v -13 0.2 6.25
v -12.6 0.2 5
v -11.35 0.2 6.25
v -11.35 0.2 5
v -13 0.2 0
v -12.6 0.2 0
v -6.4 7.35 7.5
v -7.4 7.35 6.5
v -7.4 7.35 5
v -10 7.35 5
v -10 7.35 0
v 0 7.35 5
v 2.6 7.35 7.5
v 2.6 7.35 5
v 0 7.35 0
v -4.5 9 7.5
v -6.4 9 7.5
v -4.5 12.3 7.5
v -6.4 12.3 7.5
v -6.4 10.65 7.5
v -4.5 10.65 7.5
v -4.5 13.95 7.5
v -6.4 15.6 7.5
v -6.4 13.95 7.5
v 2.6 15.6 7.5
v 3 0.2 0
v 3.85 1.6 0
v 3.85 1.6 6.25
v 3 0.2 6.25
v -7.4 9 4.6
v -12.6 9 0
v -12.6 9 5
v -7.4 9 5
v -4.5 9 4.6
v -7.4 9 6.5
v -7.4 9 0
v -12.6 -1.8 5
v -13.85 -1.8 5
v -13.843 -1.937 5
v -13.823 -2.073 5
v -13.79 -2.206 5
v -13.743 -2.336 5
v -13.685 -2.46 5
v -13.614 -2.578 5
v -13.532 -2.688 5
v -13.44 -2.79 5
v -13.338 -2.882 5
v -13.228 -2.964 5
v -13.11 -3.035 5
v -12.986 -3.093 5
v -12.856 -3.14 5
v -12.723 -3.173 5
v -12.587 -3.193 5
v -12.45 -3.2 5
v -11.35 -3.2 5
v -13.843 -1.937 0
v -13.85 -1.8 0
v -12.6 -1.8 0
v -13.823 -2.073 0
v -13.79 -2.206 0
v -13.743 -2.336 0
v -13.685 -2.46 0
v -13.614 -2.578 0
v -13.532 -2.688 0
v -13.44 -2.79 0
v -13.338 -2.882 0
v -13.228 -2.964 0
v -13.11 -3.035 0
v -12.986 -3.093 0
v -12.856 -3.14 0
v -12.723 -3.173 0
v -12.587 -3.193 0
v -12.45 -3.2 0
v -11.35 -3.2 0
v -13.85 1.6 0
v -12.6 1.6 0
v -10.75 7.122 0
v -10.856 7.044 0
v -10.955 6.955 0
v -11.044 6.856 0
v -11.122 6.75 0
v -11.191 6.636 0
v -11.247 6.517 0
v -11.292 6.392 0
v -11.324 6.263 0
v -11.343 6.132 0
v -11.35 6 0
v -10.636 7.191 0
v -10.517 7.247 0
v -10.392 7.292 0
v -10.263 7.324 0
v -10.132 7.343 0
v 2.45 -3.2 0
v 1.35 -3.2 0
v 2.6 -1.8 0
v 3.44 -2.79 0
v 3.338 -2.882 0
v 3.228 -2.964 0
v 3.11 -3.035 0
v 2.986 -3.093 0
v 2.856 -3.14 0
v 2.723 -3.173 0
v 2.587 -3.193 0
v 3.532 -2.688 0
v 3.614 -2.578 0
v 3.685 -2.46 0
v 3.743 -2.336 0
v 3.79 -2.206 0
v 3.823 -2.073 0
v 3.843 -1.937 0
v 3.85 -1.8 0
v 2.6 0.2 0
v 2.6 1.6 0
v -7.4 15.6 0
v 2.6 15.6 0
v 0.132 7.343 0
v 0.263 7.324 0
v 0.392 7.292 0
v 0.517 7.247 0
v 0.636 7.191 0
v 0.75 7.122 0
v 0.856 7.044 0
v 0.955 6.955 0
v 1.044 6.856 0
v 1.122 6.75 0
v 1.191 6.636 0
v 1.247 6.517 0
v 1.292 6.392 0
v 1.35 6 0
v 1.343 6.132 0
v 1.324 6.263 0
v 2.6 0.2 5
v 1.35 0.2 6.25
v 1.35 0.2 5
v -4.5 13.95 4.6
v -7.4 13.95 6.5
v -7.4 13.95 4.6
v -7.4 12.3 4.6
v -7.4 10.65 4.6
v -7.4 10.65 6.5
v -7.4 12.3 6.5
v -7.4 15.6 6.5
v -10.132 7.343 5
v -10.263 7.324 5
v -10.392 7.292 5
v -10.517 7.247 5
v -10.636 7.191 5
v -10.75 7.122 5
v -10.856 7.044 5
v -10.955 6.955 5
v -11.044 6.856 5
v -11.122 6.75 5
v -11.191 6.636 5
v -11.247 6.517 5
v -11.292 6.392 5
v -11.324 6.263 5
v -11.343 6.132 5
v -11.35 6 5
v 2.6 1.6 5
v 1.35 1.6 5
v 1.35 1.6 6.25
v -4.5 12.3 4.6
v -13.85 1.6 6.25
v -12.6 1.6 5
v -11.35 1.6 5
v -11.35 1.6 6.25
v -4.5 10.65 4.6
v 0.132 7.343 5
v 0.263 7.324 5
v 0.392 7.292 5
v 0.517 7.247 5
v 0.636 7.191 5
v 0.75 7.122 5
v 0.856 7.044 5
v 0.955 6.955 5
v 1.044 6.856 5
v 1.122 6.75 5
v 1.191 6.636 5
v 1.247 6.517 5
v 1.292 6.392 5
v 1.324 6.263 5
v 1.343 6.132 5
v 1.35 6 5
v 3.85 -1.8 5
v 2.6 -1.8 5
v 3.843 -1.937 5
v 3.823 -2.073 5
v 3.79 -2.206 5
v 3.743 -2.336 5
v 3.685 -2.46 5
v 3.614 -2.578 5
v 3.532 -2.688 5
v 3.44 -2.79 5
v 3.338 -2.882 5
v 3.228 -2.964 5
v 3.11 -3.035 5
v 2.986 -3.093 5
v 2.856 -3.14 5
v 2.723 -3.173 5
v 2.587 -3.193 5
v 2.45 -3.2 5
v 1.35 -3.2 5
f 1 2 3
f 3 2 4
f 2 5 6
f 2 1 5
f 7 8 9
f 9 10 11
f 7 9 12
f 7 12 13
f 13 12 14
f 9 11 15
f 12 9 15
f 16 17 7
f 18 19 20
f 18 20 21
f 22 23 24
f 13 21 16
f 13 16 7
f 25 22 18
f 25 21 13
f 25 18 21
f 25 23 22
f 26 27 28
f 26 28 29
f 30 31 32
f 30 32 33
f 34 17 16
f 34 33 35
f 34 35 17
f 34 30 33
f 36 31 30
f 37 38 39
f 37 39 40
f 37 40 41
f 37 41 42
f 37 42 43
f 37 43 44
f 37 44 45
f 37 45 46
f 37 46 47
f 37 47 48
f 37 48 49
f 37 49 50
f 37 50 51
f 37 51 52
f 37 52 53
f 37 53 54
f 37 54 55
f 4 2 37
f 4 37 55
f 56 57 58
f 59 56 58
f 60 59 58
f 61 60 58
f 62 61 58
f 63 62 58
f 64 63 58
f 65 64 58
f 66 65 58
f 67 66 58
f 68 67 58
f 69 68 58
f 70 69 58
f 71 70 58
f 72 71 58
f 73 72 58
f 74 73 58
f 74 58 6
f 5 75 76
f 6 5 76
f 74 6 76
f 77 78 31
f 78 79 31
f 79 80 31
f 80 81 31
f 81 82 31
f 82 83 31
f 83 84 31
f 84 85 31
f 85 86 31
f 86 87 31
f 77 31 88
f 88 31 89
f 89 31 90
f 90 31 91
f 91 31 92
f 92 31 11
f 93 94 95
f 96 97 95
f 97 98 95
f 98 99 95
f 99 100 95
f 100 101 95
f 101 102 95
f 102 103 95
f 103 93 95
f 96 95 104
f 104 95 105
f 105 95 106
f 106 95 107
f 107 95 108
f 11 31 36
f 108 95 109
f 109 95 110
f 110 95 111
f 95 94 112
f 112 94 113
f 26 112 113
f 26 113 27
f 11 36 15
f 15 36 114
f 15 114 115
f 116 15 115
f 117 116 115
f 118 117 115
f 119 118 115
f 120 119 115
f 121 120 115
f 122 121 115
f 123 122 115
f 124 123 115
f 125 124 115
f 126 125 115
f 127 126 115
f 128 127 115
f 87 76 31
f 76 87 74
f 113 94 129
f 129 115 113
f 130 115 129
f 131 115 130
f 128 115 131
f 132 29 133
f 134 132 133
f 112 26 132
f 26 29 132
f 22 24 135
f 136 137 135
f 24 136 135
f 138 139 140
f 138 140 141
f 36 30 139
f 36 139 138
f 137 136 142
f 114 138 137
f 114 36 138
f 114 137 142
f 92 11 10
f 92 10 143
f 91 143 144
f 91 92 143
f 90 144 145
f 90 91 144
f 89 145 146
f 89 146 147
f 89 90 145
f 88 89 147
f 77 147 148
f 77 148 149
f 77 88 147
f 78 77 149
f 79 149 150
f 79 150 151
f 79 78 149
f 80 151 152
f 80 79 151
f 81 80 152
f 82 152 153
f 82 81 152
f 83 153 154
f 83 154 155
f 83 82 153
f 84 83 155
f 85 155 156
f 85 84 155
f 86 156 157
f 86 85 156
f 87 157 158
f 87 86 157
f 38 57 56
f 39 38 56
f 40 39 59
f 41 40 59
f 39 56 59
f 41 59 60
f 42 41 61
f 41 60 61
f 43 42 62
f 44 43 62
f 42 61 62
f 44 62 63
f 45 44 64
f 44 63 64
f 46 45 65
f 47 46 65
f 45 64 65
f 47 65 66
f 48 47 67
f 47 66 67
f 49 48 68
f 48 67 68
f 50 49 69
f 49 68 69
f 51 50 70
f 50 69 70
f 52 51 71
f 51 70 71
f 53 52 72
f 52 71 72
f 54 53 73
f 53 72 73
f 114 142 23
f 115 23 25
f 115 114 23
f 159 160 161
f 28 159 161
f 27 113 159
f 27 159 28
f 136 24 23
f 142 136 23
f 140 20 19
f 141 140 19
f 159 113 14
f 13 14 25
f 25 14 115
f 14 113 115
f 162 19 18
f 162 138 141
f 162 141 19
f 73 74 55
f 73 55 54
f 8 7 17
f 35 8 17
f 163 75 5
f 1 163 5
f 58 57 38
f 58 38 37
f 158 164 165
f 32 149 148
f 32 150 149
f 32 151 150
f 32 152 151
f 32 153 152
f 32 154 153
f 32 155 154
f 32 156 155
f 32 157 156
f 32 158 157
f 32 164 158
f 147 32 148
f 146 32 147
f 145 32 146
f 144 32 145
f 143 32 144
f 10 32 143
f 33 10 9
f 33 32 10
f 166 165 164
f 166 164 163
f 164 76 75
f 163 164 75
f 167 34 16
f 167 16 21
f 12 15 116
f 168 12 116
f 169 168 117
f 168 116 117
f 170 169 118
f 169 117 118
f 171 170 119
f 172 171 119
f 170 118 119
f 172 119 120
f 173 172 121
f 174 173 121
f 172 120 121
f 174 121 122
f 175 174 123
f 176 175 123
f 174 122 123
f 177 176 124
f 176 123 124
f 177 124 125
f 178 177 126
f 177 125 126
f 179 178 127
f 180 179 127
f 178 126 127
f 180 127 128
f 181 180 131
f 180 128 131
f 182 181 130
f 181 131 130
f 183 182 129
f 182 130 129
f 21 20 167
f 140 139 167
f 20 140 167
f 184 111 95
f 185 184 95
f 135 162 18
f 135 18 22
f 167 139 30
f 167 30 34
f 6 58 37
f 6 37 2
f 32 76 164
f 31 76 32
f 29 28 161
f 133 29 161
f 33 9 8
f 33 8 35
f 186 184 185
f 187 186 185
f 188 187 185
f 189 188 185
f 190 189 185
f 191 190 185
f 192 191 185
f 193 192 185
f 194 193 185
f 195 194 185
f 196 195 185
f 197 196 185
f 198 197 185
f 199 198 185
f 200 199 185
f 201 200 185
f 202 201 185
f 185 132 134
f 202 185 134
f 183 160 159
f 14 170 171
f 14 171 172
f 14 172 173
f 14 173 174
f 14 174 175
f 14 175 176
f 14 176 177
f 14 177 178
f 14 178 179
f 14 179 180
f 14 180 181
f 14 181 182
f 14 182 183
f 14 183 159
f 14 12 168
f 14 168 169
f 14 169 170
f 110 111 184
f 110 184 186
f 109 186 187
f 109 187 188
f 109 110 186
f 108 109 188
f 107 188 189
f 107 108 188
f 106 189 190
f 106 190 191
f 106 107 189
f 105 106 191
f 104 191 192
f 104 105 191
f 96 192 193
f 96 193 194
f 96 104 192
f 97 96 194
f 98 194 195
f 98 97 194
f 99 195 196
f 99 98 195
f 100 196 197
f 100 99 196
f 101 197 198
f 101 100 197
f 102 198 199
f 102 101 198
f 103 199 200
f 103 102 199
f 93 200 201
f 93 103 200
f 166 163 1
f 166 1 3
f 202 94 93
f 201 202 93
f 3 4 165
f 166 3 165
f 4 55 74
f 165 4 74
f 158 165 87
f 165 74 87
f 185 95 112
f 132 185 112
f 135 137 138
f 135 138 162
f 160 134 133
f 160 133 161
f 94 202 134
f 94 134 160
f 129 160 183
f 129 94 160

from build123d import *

# Parameters (mm, degrees)
PAD017_DEPTH           = 5
PAD020_DEPTH           = 6.25
SKETCH038_W            = 10
SKETCH038_H            = 1.65
PAD021_DEPTH           = 5
SKETCH085_W            = 10
SKETCH085_H            = 1.65
PAD054_DEPTH           = 7.5
SKETCH083_W            = 7.1
SKETCH083_H            = 1.65
PAD055_DEPTH           = 7.5
SKETCH082_W            = 10
SKETCH082_H            = 1.65
PAD056_DEPTH           = 4.6
SKETCH084_W            = 10
SKETCH084_H            = 1.65
PAD057_DEPTH           = 7.5
LINEARPATTERN019_COUNT = 2
LINEARPATTERN019_PITCH = 3.3
CHAMFER009_SIZE        = 1


with BuildPart() as bc_c:
    # Sketch034 → Pad017 (new body)
    with BuildSketch(Plane.XY):
        with BuildLine():
            Line((-1.35, -1.8), (-1.35, 6))
            ThreePointArc((0, 7.35), (-0.954594, 6.954594), (-1.35, 6))
            Line((0, 9), (0, 7.35))
            Line((-2.6, 9), (0, 9))
            Line((-2.6, -1.8), (-2.6, 9))
            Line((-3.85, -1.8), (-2.6, -1.8))
            ThreePointArc((-3.85, -1.8), (-3.439949, -2.789949), (-2.45, -3.2))
            Line((-1.35, -3.2), (-2.45, -3.2))
            Line((-1.35, -1.8), (-1.35, -3.2))
        make_face()
    extrude(amount=PAD017_DEPTH)

    # Sketch037 → Pad020 (join)
    with BuildSketch(Plane.XY):
        Polygon((-1.35, 0.2), (-1.35, 1.6), (-2.6, 1.6), (-3.85, 1.6), (-3, 0.2), (-2.6, 0.2), align=None)
    extrude(amount=PAD020_DEPTH)


with BuildPart() as body030:
    # Mirror002: instance of _bc_c
    add(bc_c.part.mirror(Plane(origin=(5, 0, 0), x_dir=(0, 1, 0), z_dir=(-1, 0, 0))))

    # Fusion002: union _bc_c
    add(bc_c.part)


with BuildPart() as body030_1:
    # Clone003 placement: moved
    add(body030.part.moved(Location((-5, 0, 0))))

    # Sketch038 → Pad021 (new body)
    with BuildSketch(Plane.XY):
        with Locations((0, 8.175)):
            Rectangle(SKETCH038_W, SKETCH038_H)
    extrude(amount=PAD021_DEPTH)

    # Sketch085 → Pad054 (new body)
    with BuildSketch(Plane.XY):
        with Locations((2.6, 8.175)):
            Rectangle(SKETCH085_W, SKETCH085_H)
    extrude(amount=PAD054_DEPTH)

    # Sketch083 → Pad055 (join)
    with BuildSketch(Plane.XY):
        with Locations((4.05, 9.825)):
            Rectangle(SKETCH083_W, SKETCH083_H)
    pad055 = extrude(amount=PAD055_DEPTH)

    # Sketch082 → Pad056 (join)
    with BuildSketch(Plane.XY):
        with Locations((2.6, 9.825)):
            Rectangle(SKETCH082_W, SKETCH082_H)
    pad056 = extrude(amount=PAD056_DEPTH)

    # Sketch084 → Pad057 (join)
    with BuildSketch(Plane.XY):
        with Locations((2.6, 11.475)):
            Rectangle(SKETCH084_W, SKETCH084_H)
    pad057 = extrude(amount=PAD057_DEPTH)

    # LinearPattern019: Pad057, Pad056, Pad055 ×2
    with Locations(*[(0, i * LINEARPATTERN019_PITCH, 0) for i in range(1, LINEARPATTERN019_COUNT)]):
        add(pad057)
        add(pad056)
        add(pad055)

    # Chamfer009
    chamfer009_edges = [body030_1.edges().sort_by_distance(p)[0] for p in [
        (-2.4, 8.175, 7.5),
        (-2.4, 11.475, 7.5),
        (-2.4, 14.775, 7.5),
    ]]
    chamfer(chamfer009_edges, length=CHAMFER009_SIZE)


with BuildPart() as body030_2:
    # Body030 placement: moved
    add(body030_1.part.moved(Location((-5, 0, 0))))


solid = body030_2.part
